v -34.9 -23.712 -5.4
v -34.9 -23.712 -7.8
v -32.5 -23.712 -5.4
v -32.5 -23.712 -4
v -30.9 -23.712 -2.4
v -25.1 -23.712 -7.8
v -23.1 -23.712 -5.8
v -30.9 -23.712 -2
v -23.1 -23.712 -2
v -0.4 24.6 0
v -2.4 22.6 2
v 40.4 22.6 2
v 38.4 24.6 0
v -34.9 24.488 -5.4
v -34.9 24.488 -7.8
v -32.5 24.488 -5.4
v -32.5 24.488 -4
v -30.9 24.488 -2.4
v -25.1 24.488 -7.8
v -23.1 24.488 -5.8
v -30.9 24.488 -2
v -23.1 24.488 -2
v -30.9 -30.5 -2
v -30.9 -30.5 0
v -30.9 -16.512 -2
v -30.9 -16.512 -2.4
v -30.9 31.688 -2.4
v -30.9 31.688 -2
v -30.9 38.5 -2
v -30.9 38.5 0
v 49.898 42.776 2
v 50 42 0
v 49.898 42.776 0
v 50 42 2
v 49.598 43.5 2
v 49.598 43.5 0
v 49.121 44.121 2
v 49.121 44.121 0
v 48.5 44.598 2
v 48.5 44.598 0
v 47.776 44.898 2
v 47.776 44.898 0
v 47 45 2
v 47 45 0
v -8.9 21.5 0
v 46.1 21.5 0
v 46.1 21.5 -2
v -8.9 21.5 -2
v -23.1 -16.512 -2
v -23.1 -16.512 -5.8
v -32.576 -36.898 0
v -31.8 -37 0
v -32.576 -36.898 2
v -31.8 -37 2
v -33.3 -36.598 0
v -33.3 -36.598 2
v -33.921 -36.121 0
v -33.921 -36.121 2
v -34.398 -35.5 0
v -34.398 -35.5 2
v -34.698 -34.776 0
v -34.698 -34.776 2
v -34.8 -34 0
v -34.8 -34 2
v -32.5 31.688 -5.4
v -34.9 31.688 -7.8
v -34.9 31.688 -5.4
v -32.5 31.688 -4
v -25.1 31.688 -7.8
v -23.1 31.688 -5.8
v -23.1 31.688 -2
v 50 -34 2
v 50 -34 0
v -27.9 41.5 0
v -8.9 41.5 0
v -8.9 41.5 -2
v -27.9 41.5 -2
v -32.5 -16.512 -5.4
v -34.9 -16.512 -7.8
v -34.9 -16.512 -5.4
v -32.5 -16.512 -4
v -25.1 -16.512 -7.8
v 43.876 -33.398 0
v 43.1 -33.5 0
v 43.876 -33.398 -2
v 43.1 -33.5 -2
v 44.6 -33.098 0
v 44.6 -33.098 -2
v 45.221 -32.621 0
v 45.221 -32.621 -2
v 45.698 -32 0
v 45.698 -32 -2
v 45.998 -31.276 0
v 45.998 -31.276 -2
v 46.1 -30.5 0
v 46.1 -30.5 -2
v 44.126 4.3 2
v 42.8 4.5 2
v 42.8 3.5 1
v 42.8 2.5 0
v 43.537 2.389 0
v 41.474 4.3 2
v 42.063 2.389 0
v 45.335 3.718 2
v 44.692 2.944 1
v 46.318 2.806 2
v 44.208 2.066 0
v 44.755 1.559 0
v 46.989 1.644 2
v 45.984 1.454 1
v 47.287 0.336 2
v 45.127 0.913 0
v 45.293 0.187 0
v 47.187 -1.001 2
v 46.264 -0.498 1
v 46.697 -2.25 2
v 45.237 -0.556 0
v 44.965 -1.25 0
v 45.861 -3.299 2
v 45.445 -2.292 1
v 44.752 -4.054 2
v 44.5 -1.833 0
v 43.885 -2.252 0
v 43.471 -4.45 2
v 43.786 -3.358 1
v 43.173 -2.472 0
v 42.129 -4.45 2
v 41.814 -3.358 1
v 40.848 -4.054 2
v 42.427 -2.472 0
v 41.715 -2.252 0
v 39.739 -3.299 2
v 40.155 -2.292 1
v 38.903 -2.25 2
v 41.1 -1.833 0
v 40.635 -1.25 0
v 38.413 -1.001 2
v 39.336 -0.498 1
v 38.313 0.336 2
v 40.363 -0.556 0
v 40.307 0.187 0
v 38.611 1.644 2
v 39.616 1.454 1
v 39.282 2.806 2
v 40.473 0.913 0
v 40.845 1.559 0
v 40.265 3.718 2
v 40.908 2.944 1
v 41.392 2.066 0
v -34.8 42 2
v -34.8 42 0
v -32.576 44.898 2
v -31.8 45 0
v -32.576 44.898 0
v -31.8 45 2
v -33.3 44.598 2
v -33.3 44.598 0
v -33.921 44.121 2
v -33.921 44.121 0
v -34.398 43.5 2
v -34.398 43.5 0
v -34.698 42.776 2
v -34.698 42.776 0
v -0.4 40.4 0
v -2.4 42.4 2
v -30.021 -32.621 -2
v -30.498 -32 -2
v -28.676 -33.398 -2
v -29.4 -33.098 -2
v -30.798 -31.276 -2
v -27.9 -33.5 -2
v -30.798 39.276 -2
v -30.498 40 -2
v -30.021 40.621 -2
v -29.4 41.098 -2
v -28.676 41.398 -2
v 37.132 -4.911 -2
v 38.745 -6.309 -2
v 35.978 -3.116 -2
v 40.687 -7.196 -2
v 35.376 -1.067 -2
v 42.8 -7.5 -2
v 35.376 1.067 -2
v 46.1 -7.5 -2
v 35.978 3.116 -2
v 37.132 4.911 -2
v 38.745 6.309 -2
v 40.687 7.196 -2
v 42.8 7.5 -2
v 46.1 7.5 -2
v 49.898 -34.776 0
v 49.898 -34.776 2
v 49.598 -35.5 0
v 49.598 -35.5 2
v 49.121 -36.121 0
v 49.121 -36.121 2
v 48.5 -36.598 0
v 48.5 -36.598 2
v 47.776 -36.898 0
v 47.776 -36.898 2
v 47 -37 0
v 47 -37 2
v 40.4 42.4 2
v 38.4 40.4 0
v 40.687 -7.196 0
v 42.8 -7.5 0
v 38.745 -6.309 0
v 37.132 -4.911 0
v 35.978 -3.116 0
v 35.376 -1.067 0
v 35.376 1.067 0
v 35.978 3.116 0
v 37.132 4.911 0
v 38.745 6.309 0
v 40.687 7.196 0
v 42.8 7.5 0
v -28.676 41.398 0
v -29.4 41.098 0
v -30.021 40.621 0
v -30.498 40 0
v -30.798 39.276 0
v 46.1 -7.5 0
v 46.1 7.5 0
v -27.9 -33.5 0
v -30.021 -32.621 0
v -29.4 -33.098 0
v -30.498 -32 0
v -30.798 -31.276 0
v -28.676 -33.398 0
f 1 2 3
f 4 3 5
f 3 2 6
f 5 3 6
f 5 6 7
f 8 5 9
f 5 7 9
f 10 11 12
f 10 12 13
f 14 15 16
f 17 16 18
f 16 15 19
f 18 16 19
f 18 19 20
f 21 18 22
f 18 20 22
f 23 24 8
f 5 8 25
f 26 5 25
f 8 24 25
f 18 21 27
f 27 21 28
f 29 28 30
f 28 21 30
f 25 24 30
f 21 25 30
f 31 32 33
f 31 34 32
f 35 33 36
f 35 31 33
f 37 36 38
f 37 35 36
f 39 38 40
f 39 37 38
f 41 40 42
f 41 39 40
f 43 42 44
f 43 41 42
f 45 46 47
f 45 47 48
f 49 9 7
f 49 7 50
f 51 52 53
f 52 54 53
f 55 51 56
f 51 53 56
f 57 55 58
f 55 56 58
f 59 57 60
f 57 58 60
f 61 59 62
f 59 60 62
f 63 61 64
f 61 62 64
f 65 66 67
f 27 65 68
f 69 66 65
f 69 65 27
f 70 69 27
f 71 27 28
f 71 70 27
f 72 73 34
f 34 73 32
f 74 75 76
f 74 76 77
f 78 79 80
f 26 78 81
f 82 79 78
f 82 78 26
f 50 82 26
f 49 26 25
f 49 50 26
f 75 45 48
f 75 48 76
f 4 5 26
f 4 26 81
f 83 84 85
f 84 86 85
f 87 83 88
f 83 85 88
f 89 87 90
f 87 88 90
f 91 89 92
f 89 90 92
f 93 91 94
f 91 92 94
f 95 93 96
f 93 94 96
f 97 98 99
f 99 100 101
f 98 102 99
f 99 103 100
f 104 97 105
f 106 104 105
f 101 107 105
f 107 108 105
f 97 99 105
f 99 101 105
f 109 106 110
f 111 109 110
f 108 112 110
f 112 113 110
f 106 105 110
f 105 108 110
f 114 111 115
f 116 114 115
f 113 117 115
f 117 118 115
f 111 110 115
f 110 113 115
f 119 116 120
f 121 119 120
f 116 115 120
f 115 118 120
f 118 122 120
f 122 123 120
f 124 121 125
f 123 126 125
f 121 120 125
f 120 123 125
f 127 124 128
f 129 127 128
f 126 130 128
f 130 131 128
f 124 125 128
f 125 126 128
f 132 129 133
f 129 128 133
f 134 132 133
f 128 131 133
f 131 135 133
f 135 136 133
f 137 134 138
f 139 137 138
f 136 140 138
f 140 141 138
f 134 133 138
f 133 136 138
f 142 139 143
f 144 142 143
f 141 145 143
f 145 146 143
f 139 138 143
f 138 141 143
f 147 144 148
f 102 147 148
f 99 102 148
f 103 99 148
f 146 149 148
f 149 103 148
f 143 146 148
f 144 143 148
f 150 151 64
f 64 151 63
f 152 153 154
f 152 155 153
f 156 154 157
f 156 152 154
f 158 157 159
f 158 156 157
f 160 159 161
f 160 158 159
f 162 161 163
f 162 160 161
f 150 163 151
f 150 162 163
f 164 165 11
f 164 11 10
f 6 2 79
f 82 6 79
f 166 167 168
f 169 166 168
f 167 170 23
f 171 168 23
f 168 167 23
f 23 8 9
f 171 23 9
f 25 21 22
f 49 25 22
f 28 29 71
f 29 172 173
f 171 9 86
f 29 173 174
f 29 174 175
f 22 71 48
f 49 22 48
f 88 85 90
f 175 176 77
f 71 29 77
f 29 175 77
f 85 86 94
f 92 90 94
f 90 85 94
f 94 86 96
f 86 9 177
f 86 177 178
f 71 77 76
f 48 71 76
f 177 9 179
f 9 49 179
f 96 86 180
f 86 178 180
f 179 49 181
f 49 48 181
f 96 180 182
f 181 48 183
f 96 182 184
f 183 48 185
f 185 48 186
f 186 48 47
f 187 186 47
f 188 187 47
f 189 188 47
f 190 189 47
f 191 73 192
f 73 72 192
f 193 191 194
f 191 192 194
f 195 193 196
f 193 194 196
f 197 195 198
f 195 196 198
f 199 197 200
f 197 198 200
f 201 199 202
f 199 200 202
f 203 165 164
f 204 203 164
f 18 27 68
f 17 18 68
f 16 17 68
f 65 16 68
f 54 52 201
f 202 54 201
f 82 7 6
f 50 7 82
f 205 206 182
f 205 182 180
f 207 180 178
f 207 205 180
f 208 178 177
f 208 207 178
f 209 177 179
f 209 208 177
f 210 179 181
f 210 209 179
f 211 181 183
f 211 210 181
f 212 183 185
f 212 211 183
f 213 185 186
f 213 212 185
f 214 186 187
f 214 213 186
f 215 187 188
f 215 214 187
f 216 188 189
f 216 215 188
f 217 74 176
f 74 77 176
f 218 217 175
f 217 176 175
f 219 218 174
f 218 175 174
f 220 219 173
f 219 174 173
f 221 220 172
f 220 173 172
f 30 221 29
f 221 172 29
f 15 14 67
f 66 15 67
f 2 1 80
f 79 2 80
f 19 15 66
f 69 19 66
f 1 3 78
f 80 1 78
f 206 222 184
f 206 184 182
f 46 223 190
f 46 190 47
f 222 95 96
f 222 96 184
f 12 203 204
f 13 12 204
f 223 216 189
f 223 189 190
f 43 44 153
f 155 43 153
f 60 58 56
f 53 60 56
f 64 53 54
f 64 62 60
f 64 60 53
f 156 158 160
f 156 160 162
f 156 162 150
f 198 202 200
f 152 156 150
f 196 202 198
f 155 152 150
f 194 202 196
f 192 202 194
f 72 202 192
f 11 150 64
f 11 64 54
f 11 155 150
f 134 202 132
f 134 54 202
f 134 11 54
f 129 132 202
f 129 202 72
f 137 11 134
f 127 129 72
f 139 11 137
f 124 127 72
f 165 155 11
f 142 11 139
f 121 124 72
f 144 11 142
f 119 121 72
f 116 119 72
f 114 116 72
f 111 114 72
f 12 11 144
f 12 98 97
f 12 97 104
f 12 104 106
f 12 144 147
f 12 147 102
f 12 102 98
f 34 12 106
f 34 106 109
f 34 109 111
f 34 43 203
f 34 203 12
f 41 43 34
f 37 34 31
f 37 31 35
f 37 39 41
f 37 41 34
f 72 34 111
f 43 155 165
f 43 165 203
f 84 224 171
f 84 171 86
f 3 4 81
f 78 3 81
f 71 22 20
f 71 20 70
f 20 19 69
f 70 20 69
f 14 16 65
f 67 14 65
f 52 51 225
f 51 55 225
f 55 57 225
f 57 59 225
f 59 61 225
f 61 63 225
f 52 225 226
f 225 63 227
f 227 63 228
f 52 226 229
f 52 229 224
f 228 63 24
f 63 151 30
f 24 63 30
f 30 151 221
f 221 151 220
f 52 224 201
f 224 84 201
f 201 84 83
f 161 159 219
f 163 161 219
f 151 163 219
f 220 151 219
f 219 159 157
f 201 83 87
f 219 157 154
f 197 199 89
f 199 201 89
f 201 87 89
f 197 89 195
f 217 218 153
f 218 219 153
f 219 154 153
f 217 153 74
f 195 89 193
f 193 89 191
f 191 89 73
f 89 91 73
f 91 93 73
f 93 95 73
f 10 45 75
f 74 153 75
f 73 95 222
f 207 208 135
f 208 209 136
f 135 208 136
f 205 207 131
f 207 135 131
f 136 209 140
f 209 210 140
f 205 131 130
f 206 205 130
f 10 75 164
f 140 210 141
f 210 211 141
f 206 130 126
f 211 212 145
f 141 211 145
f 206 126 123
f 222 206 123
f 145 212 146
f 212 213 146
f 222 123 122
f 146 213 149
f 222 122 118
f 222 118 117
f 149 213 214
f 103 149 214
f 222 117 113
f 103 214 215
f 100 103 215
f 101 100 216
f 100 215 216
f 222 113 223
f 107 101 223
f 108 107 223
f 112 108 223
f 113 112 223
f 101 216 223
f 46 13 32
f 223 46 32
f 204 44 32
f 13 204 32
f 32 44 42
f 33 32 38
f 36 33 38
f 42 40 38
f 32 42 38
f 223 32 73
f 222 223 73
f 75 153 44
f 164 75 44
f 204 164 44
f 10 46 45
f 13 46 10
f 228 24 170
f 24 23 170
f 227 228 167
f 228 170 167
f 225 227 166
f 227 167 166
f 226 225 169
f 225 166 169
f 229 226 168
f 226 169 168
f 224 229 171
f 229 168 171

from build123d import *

# Parameters (mm, degrees)
F1_DEPTH     = 2
F2_R         = 3
F0_W         = 55
F0_H         = 20
F0_W_2       = 38
F0_H_2       = 15
F3_DEPTH     = 2
F4_R         = 3
F5_T1_DEPTH  = 38
F5_T3_DEPTH  = 15
F5_T9_DEPTH  = 44.1720391711
F5_T13_DEPTH = 21.1720391711
F5_T20_DEPTH = 44.1720391711
F5_T24_DEPTH = 21.1720391711
F5_T31_DEPTH = 21.1720391711
F5_T35_DEPTH = 44.1720391711
F5_T42_DEPTH = 44.1720391711
F5_T46_DEPTH = 21.1720391711
F8_START     = -23.1
F7_W         = 7.2
F7_H         = 3.4
F8_DEPTH     = 9.4
F9_START     = -23.1
F7_H_2       = 2.4
F9_DEPTH     = 11.8
F10_SIZE     = 2
F11_T4_DEPTH = 17.4867319519
F11_T9_DEPTH = 17.4867319519


# Not quite as in the source:
# - a fillet or chamfer that OpenCascade refuses, or shapes differently, is made with other operations: its cross-section is extruded or revolved along the edge and cut away or added
# - a feature names something its author has since deleted; it is built from what else it names


with BuildPart() as f1:
    # F0 (on Top) → F1 (new body)
    with BuildSketch(Plane.XY):
        with BuildLine():
            Line((42.8, 7.5), (46.1, 7.5))
            Line((46.1, 7.5), (46.1, 21.5))
            Line((46.1, 21.5), (-8.9, 21.5))
            Line((-8.9, 21.5), (-8.9, 41.5))
            Line((-8.9, 41.5), (-30.9, 41.5))
            Line((-30.9, 41.5), (-30.9, -33.5))
            Line((-30.9, -33.5), (46.1, -33.5))
            Line((46.1, -33.5), (46.1, -7.5))
            Line((46.1, -7.5), (42.8, -7.5))
            ThreePointArc((42.8, -7.5), (35.3, 0), (42.8, 7.5))
        make_face()
    extrude(amount=-F1_DEPTH)

    # F2
    f2_edges = [f1.edges().sort_by_distance(p)[0] for p in [
        (46.1, -33.5, -1),
        (-30.9, -33.5, -1),
        (-30.9, 41.5, -1),
    ]]
    fillet(f2_edges, radius=F2_R)

    # F0 (on Top) → F3 (join)
    with BuildSketch(Plane.XY):
        with Locations((18.6, 31.5)):
            Rectangle(F0_W, F0_H)
        with Locations((19, 32.5)):
            Rectangle(F0_W_2, F0_H_2, mode=Mode.SUBTRACT)
        with BuildLine():
            Line((42.8, 7.5), (46.1, 7.5))
            Line((46.1, 7.5), (46.1, 21.5))
            Line((46.1, 21.5), (-8.9, 21.5))
            Line((-8.9, 21.5), (-8.9, 41.5))
            Line((-8.9, 41.5), (-30.9, 41.5))
            Line((-30.9, 41.5), (-30.9, -33.5))
            Line((-30.9, -33.5), (46.1, -33.5))
            Line((46.1, -33.5), (46.1, -7.5))
            Line((46.1, -7.5), (42.8, -7.5))
            ThreePointArc((42.8, -7.5), (35.3, 0), (42.8, 7.5))
        make_face()
        with BuildLine():
            Line((42.8, 1.5), (42.8, 7.5))
            ThreePointArc((42.8, 7.5), (35.3, 0), (42.8, -7.5))
            Line((42.8, -7.5), (42.8, -1.5))
            ThreePointArc((42.8, -1.5), (41.3, 0), (42.8, 1.5))
        make_face()
        with BuildLine():
            Line((46.1, -6.7349832962), (46.1, 6.7349832962))
            ThreePointArc((46.1, 6.7349832962), (44.4937569599, 7.3062430401), (42.8, 7.5))
            Line((42.8, 7.5), (42.8, 1.5))
            ThreePointArc((42.8, 1.5), (43.8606601718, 1.0606601718), (44.3, 0))
            ThreePointArc((44.3, 0), (43.8606601718, -1.0606601718), (42.8, -1.5))
            Line((42.8, -1.5), (42.8, -7.5))
            ThreePointArc((42.8, -7.5), (44.4937569599, -7.3062430401), (46.1, -6.7349832962))
        make_face()
        with BuildLine():
            Line((46.1, -7.5), (46.1, -6.7349832962))
            ThreePointArc((46.1, -6.7349832962), (44.4937569599, -7.3062430401), (42.8, -7.5))
            Line((42.8, -7.5), (46.1, -7.5))
        make_face()
        with BuildLine():
            Line((50, 45), (-34.8, 45))
            Line((-34.8, 45), (-34.8, -37))
            Line((-34.8, -37), (50, -37))
            Line((50, -37), (50, -2.1))
            ThreePointArc((50, -2.1), (48.538751392, -4.8287402561), (46.1, -6.7349832962))
            Line((46.1, -6.7349832962), (46.1, -7.5))
            Line((46.1, -7.5), (46.1, -33.5))
            Line((46.1, -33.5), (-30.9, -33.5))
            Line((-30.9, -33.5), (-30.9, 41.5))
            Line((-30.9, 41.5), (-8.9, 41.5))
            Line((-8.9, 41.5), (46.1, 41.5))
            Line((46.1, 41.5), (46.1, 21.5))
            Line((46.1, 21.5), (46.1, 7.5))
            Line((46.1, 7.5), (46.1, 6.7349832962))
            ThreePointArc((46.1, 6.7349832962), (48.538751392, 4.8287402561), (50, 2.1))
            Line((50, 2.1), (50, 45))
        make_face()
        with BuildLine():
            Line((50, -2.1), (50, 2.1))
            ThreePointArc((50, 2.1), (48.538751392, 4.8287402561), (46.1, 6.7349832962))
            Line((46.1, 6.7349832962), (46.1, -6.7349832962))
            ThreePointArc((46.1, -6.7349832962), (48.538751392, -4.8287402561), (50, -2.1))
        make_face()
        with BuildLine():
            ThreePointArc((42.8, 7.5), (44.4937569599, 7.3062430401), (46.1, 6.7349832962))
            Line((46.1, 6.7349832962), (46.1, 7.5))
            Line((46.1, 7.5), (42.8, 7.5))
        make_face()
    extrude(amount=F3_DEPTH)

    # F4
    f4_edges = [f1.edges().sort_by_distance(p)[0] for p in [
        (50, -37, 1),
        (-34.8, -37, 1),
        (-34.8, 45, 1),
        (50, 45, 1),
    ]]
    fillet(f4_edges, radius=F4_R)

    # F5: chamfer of 2.4 on 4 edges, made by hand

    # F5_s2 → F5_t1 (cut)
    with BuildSketch(Plane.YZ):
        Polygon((42.4, 2), (40, -0.4), (40, 2), align=None)
        Polygon((22.6, 2), (25, -0.4), (25, 2), align=None)
    extrude(amount=F5_T1_DEPTH, mode=Mode.SUBTRACT)

    # F5_s4 → F5_t3 (cut)
    with BuildSketch(Plane.XZ.offset(-40)):
        Polygon((40.4, 2), (38, -0.4), (38, 2), align=None)
        Polygon((-2.4, 2), (0, -0.4), (0, 2), align=None)
    extrude(amount=F5_T3_DEPTH, mode=Mode.SUBTRACT)


with BuildPart() as f5_tool7:
    # F5_s8 → F5_t9 (new body)
    with BuildSketch(Plane.YZ.offset(-6.1720391711)):
        Polygon((42.4, 2), (40, -0.4), (40, 2), align=None)
    extrude(amount=F5_T9_DEPTH)

    split(bisect_by=Plane.YZ, keep=Keep.BOTTOM)


with BuildPart() as f5_tool11:
    # F5_s12 → F5_t13 (new body)
    with BuildSketch(Plane.XZ.offset(-25)):
        Polygon((-2.4, 2), (0, -0.4), (0, 2), align=None)
    extrude(amount=-F5_T13_DEPTH)

    split(bisect_by=Plane.XZ.offset(-40), keep=Keep.BOTTOM)


with BuildPart() as f5_tool7_1:
    add(f5_tool7.part)

    # F5_t15: intersect F5_tool11
    add(f5_tool11.part, mode=Mode.INTERSECT)


with BuildPart() as f1_1:
    add(f1.part)

    # F5_t5: cut F5_tool7
    add(f5_tool7_1.part, mode=Mode.SUBTRACT)


with BuildPart() as f5_tool18:
    # F5_s19 → F5_t20 (new body)
    with BuildSketch(Plane.YZ):
        Polygon((42.4, 2), (40, -0.4), (40, 2), align=None)
    extrude(amount=F5_T20_DEPTH)

    split(bisect_by=Plane.YZ.offset(38), keep=Keep.TOP)


with BuildPart() as f5_tool22:
    # F5_s23 → F5_t24 (new body)
    with BuildSketch(Plane.XZ.offset(-46.1720391711)):
        Polygon((40.4, 2), (38, -0.4), (38, 2), align=None)
    extrude(amount=F5_T24_DEPTH)

    split(bisect_by=Plane.XZ.offset(-40), keep=Keep.BOTTOM)


with BuildPart() as f5_tool18_1:
    add(f5_tool18.part)

    # F5_t26: intersect F5_tool22
    add(f5_tool22.part, mode=Mode.INTERSECT)


with BuildPart() as f1_2:
    add(f1_1.part)

    # F5_t16: cut F5_tool18
    add(f5_tool18_1.part, mode=Mode.SUBTRACT)


with BuildPart() as f5_tool29:
    # F5_s30 → F5_t31 (new body)
    with BuildSketch(Plane.XZ.offset(-40)):
        Polygon((40.4, 2), (38, -0.4), (38, 2), align=None)
    extrude(amount=F5_T31_DEPTH)

    split(bisect_by=Plane.XZ.offset(-25), keep=Keep.TOP)


with BuildPart() as f5_tool33:
    # F5_s34 → F5_t35 (new body)
    with BuildSketch(Plane.YZ.offset(44.1720391711)):
        Polygon((22.6, 2), (25, -0.4), (25, 2), align=None)
    extrude(amount=-F5_T35_DEPTH)

    split(bisect_by=Plane.YZ.offset(38), keep=Keep.TOP)


with BuildPart() as f5_tool29_1:
    add(f5_tool29.part)

    # F5_t37: intersect F5_tool33
    add(f5_tool33.part, mode=Mode.INTERSECT)


with BuildPart() as f1_3:
    add(f1_2.part)

    # F5_t27: cut F5_tool29
    add(f5_tool29_1.part, mode=Mode.SUBTRACT)


with BuildPart() as f5_tool40:
    # F5_s41 → F5_t42 (new body)
    with BuildSketch(Plane.YZ.offset(38)):
        Polygon((22.6, 2), (25, -0.4), (25, 2), align=None)
    extrude(amount=-F5_T42_DEPTH)

    split(bisect_by=Plane.YZ, keep=Keep.BOTTOM)


with BuildPart() as f5_tool44:
    # F5_s45 → F5_t46 (new body)
    with BuildSketch(Plane.XZ.offset(-18.8279608289)):
        Polygon((-2.4, 2), (0, -0.4), (0, 2), align=None)
    extrude(amount=-F5_T46_DEPTH)

    split(bisect_by=Plane.XZ.offset(-25), keep=Keep.TOP)


with BuildPart() as f5_tool40_1:
    add(f5_tool40.part)

    # F5_t48: intersect F5_tool44
    add(f5_tool44.part, mode=Mode.INTERSECT)


with BuildPart() as f1_4:
    add(f1_3.part)

    # F5_t38: cut F5_tool40
    add(f5_tool40_1.part, mode=Mode.SUBTRACT)

    # F6: chamfer of 3 on 1 edges, made by hand

    # F6_s1 → F6_t2 (revolve, cut)
    with BuildSketch(Plane.YZ.offset(42.8)):
        Polygon((4.5, 2), (1.5, -1), (1.5, 2), align=None)
    revolve(axis=Axis((42.8, 0, 2), (0, 0, -1)), mode=Mode.SUBTRACT)

    # F7 (on Right) → F8 (join)
    with BuildSketch(Plane.YZ.offset(F8_START)):
        with Locations((28.0882296383, -3.7)):
            Rectangle(F7_W, F7_H)
        with Locations((-20.1117703617, -3.7)):
            Rectangle(F7_W, F7_H)
    extrude(amount=-F8_DEPTH)

    # F7 (on Right) → F9 (join)
    with BuildSketch(Plane.YZ.offset(F9_START)):
        with Locations((28.0882296383, -6.6)):
            Rectangle(F7_W, F7_H_2)
        with Locations((-20.1117703617, -6.6)):
            Rectangle(F7_W, F7_H_2)
    extrude(amount=-F9_DEPTH)

    # F10
    f10_edges = [f1_4.edges().sort_by_distance(p)[0] for p in [
        (-23.1, -20.11177, -7.8),
        (-23.1, 28.08823, -7.8),
    ]]
    chamfer(f10_edges, length=F10_SIZE)

    # F11: chamfer of 2 on 2 edges, made by hand


with BuildPart() as f11_tool2:
    # F11_s3 → F11_t4 (new body)
    with BuildSketch(Plane.XZ.offset(11.3684043857)):
        Polygon((-30.5, -2), (-32.5, -4), (-32.5, -2), align=None)
    extrude(amount=F11_T4_DEPTH)

    split(bisect_by=Plane.YZ.offset(-30.9), keep=Keep.BOTTOM)


with BuildPart() as f1_5:
    add(f1_4.part)

    # F11_t1: cut F11_tool2
    add(f11_tool2.part, mode=Mode.SUBTRACT)


with BuildPart() as f11_tool7:
    # F11_s8 → F11_t9 (new body)
    with BuildSketch(Plane.XZ.offset(-36.8315956143)):
        Polygon((-30.5, -2), (-32.5, -4), (-32.5, -2), align=None)
    extrude(amount=F11_T9_DEPTH)

    split(bisect_by=Plane.YZ.offset(-30.9), keep=Keep.BOTTOM)


with BuildPart() as f1_6:
    add(f1_5.part)

    # F11_t6: cut F11_tool7
    add(f11_tool7.part, mode=Mode.SUBTRACT)


solid = f1_6.part
